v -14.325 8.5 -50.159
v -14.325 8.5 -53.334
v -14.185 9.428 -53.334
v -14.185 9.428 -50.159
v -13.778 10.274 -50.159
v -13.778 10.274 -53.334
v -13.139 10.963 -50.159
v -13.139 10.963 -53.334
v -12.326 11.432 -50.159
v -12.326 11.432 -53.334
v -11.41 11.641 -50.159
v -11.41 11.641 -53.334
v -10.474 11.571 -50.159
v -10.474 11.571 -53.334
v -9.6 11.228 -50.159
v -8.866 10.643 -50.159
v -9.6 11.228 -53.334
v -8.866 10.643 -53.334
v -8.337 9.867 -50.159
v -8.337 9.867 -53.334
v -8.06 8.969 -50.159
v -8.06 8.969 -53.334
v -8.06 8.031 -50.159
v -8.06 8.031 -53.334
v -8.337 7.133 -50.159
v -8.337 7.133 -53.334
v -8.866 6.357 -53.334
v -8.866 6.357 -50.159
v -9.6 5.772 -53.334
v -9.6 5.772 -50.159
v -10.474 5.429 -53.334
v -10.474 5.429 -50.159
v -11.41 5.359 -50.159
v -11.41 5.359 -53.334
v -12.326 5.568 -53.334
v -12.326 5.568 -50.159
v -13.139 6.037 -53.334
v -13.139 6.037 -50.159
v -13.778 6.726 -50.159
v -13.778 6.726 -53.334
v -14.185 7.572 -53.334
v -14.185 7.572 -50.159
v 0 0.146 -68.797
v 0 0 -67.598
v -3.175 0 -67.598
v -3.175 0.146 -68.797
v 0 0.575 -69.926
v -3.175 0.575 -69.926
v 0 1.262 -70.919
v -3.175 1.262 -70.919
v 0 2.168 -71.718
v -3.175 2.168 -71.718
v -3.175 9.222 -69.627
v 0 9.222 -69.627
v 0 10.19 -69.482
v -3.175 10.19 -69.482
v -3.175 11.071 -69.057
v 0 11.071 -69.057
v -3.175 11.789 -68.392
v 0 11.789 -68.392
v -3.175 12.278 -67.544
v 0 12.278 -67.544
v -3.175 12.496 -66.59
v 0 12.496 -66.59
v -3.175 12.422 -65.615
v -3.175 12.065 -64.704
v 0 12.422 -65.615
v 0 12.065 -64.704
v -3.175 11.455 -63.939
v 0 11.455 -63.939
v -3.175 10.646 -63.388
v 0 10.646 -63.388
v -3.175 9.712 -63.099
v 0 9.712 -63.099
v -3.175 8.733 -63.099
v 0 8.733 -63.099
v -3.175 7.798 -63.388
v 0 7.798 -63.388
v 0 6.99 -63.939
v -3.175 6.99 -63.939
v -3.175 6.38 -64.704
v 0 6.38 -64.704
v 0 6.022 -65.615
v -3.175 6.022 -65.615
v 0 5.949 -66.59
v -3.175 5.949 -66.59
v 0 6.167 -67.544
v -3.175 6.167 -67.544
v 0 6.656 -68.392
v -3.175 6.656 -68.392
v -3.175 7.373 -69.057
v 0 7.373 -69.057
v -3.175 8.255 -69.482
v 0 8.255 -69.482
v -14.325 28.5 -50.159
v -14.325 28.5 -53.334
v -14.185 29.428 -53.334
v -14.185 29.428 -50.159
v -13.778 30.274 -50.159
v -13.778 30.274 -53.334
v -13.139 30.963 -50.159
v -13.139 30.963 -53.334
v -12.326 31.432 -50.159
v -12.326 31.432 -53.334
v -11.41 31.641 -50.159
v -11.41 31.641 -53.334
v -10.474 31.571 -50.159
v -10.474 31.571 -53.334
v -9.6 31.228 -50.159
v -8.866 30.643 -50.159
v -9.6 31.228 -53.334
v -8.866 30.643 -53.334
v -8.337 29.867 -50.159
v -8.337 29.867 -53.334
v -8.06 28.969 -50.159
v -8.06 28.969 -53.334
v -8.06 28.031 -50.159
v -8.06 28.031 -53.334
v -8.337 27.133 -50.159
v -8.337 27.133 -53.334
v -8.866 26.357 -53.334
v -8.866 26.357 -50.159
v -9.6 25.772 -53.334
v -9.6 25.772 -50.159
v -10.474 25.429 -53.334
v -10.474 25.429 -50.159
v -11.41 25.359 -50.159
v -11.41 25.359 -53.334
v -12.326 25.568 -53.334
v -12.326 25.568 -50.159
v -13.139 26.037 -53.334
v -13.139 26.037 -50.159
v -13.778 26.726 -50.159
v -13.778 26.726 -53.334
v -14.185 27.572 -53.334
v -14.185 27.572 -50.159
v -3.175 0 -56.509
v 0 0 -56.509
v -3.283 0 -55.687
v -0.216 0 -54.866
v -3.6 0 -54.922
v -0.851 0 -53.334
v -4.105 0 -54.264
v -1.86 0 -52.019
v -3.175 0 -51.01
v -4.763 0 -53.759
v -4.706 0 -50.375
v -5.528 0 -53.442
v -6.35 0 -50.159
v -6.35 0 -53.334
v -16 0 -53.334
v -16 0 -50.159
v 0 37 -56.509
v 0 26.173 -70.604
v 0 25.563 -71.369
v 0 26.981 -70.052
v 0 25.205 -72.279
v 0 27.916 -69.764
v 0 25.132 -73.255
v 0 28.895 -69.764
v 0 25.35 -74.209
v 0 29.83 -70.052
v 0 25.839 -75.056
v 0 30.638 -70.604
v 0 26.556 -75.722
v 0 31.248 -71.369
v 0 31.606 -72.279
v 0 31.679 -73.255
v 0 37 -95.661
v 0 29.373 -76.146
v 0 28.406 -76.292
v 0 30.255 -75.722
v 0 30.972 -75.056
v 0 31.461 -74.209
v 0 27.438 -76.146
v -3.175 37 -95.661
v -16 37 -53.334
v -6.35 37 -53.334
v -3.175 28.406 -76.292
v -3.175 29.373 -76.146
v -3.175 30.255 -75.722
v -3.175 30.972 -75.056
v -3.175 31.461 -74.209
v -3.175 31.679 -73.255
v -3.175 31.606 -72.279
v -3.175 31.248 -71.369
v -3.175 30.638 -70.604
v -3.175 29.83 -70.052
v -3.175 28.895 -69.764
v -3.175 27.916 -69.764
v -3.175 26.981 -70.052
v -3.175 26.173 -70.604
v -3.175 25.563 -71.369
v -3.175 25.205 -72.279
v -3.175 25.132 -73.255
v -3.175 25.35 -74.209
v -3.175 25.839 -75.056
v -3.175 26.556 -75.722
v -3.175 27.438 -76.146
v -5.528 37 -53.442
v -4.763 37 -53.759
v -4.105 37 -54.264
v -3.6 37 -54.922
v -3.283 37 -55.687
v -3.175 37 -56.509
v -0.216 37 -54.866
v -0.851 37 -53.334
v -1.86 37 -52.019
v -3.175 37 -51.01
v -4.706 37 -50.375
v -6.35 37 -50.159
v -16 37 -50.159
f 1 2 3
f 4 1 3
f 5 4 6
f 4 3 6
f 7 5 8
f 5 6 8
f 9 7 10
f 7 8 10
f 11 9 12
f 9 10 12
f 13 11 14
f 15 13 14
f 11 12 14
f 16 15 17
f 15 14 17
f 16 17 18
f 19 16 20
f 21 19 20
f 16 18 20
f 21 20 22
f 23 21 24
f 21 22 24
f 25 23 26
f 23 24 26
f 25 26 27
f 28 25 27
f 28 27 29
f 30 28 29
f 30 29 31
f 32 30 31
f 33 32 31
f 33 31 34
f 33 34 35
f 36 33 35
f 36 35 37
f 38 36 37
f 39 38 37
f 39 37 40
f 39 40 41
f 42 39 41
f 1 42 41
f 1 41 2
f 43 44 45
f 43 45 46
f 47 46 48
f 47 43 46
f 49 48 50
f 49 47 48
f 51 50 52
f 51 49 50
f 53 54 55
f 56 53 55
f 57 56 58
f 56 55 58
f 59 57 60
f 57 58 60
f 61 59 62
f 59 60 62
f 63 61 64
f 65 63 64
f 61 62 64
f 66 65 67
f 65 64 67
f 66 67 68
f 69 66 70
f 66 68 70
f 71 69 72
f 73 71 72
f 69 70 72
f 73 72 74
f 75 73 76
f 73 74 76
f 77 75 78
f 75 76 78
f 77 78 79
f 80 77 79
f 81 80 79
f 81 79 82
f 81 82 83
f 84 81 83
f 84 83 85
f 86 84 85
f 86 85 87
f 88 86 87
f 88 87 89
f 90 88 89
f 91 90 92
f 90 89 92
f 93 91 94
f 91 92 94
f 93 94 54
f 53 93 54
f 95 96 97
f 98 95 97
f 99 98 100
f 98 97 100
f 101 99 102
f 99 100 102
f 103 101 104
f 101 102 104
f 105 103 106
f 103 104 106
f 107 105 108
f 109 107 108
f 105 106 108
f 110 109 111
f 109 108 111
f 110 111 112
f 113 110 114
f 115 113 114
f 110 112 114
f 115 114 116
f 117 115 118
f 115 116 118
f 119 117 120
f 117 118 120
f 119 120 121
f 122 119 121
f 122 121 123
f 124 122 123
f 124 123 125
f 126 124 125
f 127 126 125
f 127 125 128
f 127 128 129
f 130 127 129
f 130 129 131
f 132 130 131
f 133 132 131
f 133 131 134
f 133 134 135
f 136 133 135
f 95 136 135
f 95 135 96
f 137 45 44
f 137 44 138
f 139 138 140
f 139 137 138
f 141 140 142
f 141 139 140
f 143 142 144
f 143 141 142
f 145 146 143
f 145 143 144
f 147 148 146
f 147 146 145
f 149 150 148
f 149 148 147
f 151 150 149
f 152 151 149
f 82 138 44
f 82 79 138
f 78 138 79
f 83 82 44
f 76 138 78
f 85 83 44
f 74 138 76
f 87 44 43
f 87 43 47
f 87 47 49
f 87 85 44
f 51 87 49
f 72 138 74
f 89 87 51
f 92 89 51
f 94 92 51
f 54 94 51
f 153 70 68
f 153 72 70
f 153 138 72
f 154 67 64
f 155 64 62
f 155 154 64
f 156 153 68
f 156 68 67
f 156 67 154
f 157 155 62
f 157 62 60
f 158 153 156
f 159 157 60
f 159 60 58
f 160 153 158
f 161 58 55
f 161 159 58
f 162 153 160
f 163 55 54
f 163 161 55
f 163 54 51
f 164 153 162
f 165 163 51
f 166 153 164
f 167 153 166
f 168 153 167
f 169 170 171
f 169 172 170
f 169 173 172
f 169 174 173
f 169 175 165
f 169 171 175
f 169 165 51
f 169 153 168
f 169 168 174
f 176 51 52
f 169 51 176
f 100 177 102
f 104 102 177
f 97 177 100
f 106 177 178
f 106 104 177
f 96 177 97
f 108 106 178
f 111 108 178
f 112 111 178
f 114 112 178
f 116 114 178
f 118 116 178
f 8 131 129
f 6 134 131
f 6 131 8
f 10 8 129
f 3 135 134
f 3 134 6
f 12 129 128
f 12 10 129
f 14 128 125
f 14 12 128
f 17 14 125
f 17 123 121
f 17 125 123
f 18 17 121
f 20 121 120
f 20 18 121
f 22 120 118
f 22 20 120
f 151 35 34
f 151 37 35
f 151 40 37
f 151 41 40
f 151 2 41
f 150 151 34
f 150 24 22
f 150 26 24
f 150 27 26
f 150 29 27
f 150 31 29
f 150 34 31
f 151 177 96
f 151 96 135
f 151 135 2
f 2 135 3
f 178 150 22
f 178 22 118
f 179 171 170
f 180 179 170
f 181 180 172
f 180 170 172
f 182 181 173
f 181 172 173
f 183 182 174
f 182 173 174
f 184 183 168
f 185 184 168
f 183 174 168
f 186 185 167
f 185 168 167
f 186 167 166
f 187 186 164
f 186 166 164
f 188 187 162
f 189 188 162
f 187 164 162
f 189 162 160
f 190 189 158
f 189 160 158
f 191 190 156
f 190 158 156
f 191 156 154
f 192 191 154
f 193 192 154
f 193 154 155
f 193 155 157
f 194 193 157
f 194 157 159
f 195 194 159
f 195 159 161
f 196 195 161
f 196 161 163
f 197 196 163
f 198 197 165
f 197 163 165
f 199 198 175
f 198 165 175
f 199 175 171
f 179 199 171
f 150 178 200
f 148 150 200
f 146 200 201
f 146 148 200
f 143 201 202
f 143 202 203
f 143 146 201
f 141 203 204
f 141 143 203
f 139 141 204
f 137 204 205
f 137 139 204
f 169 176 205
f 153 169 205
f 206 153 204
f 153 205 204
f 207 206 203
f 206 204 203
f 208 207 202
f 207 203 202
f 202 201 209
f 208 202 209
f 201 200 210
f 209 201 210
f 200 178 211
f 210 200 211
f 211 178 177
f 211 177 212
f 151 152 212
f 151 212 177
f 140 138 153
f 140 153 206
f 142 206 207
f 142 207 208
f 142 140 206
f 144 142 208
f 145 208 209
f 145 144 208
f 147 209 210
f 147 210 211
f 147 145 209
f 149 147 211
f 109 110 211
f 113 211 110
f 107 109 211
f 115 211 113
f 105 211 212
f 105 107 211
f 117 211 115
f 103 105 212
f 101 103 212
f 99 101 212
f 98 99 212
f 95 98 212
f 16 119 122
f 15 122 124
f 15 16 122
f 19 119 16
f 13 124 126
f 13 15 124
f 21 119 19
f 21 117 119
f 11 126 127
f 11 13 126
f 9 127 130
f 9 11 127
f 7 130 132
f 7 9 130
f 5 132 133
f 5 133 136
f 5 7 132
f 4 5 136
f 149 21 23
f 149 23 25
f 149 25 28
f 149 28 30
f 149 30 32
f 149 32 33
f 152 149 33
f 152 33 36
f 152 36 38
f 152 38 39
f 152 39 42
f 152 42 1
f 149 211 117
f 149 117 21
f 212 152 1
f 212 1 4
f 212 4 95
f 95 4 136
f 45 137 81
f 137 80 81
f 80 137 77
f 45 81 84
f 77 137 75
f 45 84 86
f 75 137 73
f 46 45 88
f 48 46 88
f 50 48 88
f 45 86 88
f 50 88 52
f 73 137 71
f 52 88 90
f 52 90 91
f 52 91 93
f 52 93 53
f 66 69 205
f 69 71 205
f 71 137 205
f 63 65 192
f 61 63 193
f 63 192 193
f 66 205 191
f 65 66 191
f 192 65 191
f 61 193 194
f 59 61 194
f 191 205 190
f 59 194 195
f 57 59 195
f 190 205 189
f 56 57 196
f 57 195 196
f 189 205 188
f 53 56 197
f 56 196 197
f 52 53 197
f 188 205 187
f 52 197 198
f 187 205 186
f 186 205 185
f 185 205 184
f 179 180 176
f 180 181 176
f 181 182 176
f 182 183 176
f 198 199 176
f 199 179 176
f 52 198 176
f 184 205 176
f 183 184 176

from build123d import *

# Parameters (mm, degrees)
SKETCH2_R                    = 3.282457618
BASE_FLANGE1_DEPTH           = 3.175
EDGE_FLANGE1_STRIP_W         = 19.05
EDGE_FLANGE1_STRIP_H         = 3.175
EDGE_FLANGE1_STRIP_CUT_DEPTH = 37
EDGE_FLANGE1_DEPTH           = 37
SKETCH6_R                    = 3.15
CUT_EXTRUDE1_DEPTH           = 10


# Sheet-metal steps are written as plain solids
with BuildPart() as part:
    # Sketch2 → Base-Flange1 (new body)
    with BuildSketch(Plane(origin=(0, 0, 0), x_dir=(0, 0, -1), z_dir=(1, 0, 0))):
        with BuildLine():
            Line((50.159054546, 37), (50.159054546, 0))
            Line((50.159054546, 0), (67.597909272, 0))
            ThreePointArc((67.597909272, 0), (69.925870777, 0.575003364), (71.718398003, 2.167761907))
            Line((71.718398003, 2.167761907), (95.660507303, 37))
            Line((95.660507303, 37), (50.159054546, 37))
        make_face()
        with Locations((73.009854993, 28.405566411)):
            Circle(SKETCH2_R, mode=Mode.SUBTRACT)
        with Locations((66.344990455, 9.222294526)):
            Circle(SKETCH2_R, mode=Mode.SUBTRACT)
    extrude(amount=-BASE_FLANGE1_DEPTH)

    # Edge-Flange1 strip (across the edge) → Edge-Flange1 strip cut (cut)
    with BuildSketch(Plane(origin=(-3.175, 0, -50.159054546), x_dir=(0, 0, -1), z_dir=(0, 1, 0))):
        with Locations((-3.175, -1.5875)):
            Rectangle(EDGE_FLANGE1_STRIP_W, EDGE_FLANGE1_STRIP_H)
    extrude(amount=EDGE_FLANGE1_STRIP_CUT_DEPTH, mode=Mode.SUBTRACT)

    # Edge-Flange1 section (across the edge) → Edge-Flange1 (add)
    with BuildSketch(Plane(origin=(-3.175, 0, -50.159054546), x_dir=(0, 0, -1), z_dir=(0, 1, 0))):
        with BuildLine():
            Line((0, 3.175), (0, 12.825))
            Line((0, 12.825), (3.175, 12.825))
            Line((3.175, 12.825), (3.175, 3.175))
            ThreePointArc((3.175, 3.175), (4.10493597, 0.92993597), (6.35, 0))
            Line((6.35, 0), (6.35, -3.175))
            ThreePointArc((6.35, -3.175), (1.859871939, -1.315128061), (0, 3.175))
        make_face()
    extrude(amount=EDGE_FLANGE1_DEPTH)

    # Sketch6 → Cut-Extrude1 (cut)
    with BuildSketch(Plane(origin=(0, 0, -53.334054546), x_dir=(-1, 0, 0), z_dir=(0, 0, -1))):
        with Locations((11.175, 28.5)):
            Circle(SKETCH6_R)
        with Locations((11.175, 8.5)):
            Circle(SKETCH6_R)
    extrude(amount=-CUT_EXTRUDE1_DEPTH, mode=Mode.SUBTRACT)


solid = part.part
